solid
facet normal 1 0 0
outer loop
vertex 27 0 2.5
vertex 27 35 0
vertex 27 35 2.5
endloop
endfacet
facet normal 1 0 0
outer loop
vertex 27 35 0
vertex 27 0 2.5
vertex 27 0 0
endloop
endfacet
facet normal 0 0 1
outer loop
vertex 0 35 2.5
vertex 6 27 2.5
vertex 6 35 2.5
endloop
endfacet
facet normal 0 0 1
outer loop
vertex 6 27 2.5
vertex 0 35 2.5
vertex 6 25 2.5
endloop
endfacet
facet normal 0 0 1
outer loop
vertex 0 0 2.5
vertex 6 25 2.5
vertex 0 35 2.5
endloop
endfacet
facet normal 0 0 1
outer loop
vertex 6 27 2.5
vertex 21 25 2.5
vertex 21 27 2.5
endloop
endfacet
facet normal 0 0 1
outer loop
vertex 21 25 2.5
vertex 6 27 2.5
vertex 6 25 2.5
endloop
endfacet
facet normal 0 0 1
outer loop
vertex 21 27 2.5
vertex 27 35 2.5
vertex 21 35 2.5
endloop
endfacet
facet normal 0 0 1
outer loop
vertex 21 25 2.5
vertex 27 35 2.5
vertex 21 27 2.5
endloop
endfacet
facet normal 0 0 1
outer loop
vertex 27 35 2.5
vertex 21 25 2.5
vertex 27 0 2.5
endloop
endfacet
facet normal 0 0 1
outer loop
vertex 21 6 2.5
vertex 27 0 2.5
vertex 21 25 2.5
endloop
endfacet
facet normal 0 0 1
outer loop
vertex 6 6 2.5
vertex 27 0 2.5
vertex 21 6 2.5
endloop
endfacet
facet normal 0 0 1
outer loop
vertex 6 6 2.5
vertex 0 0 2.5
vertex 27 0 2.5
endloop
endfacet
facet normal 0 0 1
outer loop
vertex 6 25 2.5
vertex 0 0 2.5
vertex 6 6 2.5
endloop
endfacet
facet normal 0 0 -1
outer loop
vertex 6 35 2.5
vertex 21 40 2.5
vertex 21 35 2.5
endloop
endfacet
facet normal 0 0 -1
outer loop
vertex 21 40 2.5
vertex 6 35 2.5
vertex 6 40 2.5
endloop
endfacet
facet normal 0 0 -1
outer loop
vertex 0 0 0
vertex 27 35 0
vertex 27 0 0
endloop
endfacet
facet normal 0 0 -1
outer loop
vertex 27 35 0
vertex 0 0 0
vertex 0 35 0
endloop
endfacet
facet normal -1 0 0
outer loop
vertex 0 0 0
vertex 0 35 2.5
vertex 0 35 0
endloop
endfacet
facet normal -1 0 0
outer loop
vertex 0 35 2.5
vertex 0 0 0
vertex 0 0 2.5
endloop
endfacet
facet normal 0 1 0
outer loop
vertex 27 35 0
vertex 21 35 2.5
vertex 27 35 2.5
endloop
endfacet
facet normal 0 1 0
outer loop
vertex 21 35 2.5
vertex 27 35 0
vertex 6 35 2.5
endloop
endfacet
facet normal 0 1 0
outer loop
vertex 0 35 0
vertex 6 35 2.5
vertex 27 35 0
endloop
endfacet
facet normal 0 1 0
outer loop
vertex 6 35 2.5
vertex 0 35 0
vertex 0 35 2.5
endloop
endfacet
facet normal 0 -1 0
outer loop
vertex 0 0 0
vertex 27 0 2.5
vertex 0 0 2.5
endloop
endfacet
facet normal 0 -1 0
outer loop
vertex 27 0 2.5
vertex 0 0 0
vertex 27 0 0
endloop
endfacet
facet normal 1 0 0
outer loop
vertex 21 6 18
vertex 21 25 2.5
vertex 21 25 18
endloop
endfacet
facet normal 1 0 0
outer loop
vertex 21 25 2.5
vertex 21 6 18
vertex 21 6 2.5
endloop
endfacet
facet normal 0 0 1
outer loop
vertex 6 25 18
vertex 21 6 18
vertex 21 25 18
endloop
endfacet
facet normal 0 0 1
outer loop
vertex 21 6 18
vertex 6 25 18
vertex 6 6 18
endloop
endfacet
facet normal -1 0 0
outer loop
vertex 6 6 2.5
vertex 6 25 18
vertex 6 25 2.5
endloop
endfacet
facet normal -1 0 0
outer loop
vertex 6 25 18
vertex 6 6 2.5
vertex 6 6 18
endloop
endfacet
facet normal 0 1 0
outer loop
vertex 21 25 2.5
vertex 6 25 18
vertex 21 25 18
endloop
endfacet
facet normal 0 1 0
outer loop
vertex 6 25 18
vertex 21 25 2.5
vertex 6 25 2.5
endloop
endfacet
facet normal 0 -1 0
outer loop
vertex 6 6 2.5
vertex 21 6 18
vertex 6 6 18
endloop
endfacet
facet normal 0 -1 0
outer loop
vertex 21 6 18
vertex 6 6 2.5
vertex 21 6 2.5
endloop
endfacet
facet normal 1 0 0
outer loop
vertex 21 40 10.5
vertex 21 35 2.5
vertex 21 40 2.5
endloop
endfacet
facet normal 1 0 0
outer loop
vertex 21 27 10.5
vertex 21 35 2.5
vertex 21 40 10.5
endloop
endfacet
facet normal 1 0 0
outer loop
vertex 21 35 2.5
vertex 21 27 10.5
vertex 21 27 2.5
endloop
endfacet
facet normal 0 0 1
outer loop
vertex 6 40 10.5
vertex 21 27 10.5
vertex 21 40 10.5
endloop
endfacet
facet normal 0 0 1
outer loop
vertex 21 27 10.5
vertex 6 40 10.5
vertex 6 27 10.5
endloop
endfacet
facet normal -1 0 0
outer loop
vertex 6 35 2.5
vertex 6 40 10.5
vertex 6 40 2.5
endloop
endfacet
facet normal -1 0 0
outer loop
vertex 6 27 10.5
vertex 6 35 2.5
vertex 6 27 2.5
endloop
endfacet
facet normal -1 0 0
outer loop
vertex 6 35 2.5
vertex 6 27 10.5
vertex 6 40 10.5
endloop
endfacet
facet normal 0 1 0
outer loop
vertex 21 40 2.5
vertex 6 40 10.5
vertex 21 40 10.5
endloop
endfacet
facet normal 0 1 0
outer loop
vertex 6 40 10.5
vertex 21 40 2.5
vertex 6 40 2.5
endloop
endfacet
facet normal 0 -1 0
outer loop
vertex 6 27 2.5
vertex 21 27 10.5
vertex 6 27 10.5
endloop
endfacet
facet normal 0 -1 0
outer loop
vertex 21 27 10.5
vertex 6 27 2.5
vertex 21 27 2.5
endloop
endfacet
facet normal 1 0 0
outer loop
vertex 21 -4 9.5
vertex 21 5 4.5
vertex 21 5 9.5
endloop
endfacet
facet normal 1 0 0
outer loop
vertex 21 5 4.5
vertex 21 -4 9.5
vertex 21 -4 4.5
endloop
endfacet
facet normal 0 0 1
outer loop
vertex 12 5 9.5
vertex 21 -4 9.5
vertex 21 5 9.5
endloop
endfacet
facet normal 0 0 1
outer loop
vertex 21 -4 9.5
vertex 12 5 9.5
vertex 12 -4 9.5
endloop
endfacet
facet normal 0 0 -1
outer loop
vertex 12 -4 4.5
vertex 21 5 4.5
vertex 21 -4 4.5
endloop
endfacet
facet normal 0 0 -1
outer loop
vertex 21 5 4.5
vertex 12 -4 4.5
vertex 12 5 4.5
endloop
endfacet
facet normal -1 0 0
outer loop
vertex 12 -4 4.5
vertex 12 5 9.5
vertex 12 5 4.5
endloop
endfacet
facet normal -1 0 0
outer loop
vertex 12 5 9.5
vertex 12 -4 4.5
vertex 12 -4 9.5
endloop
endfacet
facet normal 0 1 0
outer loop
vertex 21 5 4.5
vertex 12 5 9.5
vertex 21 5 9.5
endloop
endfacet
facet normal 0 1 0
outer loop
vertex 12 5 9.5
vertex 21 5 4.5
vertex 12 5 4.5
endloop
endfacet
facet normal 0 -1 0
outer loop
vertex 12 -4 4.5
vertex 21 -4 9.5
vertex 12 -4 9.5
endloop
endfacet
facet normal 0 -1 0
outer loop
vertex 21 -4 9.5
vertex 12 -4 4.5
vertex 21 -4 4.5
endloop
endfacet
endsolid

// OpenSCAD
// file: holder.scad
module holder(x, y, z, width, cleareance){
    wall = (2*width) + (2*cleareance) ;
    trans = width + cleareance; 
    difference(){
        cube([x + wall, y + wall, z + wall]);
        translate([width , width, trans])
        cube([x + (2*cleareance) , y + (2*cleareance), z + wall+1]);
    }
}   
// main file
use <holder.scad>


module 3dr(){
    x=27;
    y=35;
    //base
    color("gray")
    cube([x,y,2.5]);
    //relay
    translate([6,6,2.5])
    color("blue")
    cube([15,19,15.5]);
    //hot conection
    translate([6,27,2.5])
    color("red")
    cube([15,13,8]);
    //logic conection
    translate([12,-4, 4.5])
    color("green")
    cube([9,9,5]);
 
}



wallWidth = 1.5;
cleareance = .4;
wall = wallWidth + cleareance;

 3dr();

//difference(){
//    holder(27,35, 5, wallWidth, cleareance);
//    translate([wall, wall, wall])
//    color("Blue")
//    3dr();
 //}
